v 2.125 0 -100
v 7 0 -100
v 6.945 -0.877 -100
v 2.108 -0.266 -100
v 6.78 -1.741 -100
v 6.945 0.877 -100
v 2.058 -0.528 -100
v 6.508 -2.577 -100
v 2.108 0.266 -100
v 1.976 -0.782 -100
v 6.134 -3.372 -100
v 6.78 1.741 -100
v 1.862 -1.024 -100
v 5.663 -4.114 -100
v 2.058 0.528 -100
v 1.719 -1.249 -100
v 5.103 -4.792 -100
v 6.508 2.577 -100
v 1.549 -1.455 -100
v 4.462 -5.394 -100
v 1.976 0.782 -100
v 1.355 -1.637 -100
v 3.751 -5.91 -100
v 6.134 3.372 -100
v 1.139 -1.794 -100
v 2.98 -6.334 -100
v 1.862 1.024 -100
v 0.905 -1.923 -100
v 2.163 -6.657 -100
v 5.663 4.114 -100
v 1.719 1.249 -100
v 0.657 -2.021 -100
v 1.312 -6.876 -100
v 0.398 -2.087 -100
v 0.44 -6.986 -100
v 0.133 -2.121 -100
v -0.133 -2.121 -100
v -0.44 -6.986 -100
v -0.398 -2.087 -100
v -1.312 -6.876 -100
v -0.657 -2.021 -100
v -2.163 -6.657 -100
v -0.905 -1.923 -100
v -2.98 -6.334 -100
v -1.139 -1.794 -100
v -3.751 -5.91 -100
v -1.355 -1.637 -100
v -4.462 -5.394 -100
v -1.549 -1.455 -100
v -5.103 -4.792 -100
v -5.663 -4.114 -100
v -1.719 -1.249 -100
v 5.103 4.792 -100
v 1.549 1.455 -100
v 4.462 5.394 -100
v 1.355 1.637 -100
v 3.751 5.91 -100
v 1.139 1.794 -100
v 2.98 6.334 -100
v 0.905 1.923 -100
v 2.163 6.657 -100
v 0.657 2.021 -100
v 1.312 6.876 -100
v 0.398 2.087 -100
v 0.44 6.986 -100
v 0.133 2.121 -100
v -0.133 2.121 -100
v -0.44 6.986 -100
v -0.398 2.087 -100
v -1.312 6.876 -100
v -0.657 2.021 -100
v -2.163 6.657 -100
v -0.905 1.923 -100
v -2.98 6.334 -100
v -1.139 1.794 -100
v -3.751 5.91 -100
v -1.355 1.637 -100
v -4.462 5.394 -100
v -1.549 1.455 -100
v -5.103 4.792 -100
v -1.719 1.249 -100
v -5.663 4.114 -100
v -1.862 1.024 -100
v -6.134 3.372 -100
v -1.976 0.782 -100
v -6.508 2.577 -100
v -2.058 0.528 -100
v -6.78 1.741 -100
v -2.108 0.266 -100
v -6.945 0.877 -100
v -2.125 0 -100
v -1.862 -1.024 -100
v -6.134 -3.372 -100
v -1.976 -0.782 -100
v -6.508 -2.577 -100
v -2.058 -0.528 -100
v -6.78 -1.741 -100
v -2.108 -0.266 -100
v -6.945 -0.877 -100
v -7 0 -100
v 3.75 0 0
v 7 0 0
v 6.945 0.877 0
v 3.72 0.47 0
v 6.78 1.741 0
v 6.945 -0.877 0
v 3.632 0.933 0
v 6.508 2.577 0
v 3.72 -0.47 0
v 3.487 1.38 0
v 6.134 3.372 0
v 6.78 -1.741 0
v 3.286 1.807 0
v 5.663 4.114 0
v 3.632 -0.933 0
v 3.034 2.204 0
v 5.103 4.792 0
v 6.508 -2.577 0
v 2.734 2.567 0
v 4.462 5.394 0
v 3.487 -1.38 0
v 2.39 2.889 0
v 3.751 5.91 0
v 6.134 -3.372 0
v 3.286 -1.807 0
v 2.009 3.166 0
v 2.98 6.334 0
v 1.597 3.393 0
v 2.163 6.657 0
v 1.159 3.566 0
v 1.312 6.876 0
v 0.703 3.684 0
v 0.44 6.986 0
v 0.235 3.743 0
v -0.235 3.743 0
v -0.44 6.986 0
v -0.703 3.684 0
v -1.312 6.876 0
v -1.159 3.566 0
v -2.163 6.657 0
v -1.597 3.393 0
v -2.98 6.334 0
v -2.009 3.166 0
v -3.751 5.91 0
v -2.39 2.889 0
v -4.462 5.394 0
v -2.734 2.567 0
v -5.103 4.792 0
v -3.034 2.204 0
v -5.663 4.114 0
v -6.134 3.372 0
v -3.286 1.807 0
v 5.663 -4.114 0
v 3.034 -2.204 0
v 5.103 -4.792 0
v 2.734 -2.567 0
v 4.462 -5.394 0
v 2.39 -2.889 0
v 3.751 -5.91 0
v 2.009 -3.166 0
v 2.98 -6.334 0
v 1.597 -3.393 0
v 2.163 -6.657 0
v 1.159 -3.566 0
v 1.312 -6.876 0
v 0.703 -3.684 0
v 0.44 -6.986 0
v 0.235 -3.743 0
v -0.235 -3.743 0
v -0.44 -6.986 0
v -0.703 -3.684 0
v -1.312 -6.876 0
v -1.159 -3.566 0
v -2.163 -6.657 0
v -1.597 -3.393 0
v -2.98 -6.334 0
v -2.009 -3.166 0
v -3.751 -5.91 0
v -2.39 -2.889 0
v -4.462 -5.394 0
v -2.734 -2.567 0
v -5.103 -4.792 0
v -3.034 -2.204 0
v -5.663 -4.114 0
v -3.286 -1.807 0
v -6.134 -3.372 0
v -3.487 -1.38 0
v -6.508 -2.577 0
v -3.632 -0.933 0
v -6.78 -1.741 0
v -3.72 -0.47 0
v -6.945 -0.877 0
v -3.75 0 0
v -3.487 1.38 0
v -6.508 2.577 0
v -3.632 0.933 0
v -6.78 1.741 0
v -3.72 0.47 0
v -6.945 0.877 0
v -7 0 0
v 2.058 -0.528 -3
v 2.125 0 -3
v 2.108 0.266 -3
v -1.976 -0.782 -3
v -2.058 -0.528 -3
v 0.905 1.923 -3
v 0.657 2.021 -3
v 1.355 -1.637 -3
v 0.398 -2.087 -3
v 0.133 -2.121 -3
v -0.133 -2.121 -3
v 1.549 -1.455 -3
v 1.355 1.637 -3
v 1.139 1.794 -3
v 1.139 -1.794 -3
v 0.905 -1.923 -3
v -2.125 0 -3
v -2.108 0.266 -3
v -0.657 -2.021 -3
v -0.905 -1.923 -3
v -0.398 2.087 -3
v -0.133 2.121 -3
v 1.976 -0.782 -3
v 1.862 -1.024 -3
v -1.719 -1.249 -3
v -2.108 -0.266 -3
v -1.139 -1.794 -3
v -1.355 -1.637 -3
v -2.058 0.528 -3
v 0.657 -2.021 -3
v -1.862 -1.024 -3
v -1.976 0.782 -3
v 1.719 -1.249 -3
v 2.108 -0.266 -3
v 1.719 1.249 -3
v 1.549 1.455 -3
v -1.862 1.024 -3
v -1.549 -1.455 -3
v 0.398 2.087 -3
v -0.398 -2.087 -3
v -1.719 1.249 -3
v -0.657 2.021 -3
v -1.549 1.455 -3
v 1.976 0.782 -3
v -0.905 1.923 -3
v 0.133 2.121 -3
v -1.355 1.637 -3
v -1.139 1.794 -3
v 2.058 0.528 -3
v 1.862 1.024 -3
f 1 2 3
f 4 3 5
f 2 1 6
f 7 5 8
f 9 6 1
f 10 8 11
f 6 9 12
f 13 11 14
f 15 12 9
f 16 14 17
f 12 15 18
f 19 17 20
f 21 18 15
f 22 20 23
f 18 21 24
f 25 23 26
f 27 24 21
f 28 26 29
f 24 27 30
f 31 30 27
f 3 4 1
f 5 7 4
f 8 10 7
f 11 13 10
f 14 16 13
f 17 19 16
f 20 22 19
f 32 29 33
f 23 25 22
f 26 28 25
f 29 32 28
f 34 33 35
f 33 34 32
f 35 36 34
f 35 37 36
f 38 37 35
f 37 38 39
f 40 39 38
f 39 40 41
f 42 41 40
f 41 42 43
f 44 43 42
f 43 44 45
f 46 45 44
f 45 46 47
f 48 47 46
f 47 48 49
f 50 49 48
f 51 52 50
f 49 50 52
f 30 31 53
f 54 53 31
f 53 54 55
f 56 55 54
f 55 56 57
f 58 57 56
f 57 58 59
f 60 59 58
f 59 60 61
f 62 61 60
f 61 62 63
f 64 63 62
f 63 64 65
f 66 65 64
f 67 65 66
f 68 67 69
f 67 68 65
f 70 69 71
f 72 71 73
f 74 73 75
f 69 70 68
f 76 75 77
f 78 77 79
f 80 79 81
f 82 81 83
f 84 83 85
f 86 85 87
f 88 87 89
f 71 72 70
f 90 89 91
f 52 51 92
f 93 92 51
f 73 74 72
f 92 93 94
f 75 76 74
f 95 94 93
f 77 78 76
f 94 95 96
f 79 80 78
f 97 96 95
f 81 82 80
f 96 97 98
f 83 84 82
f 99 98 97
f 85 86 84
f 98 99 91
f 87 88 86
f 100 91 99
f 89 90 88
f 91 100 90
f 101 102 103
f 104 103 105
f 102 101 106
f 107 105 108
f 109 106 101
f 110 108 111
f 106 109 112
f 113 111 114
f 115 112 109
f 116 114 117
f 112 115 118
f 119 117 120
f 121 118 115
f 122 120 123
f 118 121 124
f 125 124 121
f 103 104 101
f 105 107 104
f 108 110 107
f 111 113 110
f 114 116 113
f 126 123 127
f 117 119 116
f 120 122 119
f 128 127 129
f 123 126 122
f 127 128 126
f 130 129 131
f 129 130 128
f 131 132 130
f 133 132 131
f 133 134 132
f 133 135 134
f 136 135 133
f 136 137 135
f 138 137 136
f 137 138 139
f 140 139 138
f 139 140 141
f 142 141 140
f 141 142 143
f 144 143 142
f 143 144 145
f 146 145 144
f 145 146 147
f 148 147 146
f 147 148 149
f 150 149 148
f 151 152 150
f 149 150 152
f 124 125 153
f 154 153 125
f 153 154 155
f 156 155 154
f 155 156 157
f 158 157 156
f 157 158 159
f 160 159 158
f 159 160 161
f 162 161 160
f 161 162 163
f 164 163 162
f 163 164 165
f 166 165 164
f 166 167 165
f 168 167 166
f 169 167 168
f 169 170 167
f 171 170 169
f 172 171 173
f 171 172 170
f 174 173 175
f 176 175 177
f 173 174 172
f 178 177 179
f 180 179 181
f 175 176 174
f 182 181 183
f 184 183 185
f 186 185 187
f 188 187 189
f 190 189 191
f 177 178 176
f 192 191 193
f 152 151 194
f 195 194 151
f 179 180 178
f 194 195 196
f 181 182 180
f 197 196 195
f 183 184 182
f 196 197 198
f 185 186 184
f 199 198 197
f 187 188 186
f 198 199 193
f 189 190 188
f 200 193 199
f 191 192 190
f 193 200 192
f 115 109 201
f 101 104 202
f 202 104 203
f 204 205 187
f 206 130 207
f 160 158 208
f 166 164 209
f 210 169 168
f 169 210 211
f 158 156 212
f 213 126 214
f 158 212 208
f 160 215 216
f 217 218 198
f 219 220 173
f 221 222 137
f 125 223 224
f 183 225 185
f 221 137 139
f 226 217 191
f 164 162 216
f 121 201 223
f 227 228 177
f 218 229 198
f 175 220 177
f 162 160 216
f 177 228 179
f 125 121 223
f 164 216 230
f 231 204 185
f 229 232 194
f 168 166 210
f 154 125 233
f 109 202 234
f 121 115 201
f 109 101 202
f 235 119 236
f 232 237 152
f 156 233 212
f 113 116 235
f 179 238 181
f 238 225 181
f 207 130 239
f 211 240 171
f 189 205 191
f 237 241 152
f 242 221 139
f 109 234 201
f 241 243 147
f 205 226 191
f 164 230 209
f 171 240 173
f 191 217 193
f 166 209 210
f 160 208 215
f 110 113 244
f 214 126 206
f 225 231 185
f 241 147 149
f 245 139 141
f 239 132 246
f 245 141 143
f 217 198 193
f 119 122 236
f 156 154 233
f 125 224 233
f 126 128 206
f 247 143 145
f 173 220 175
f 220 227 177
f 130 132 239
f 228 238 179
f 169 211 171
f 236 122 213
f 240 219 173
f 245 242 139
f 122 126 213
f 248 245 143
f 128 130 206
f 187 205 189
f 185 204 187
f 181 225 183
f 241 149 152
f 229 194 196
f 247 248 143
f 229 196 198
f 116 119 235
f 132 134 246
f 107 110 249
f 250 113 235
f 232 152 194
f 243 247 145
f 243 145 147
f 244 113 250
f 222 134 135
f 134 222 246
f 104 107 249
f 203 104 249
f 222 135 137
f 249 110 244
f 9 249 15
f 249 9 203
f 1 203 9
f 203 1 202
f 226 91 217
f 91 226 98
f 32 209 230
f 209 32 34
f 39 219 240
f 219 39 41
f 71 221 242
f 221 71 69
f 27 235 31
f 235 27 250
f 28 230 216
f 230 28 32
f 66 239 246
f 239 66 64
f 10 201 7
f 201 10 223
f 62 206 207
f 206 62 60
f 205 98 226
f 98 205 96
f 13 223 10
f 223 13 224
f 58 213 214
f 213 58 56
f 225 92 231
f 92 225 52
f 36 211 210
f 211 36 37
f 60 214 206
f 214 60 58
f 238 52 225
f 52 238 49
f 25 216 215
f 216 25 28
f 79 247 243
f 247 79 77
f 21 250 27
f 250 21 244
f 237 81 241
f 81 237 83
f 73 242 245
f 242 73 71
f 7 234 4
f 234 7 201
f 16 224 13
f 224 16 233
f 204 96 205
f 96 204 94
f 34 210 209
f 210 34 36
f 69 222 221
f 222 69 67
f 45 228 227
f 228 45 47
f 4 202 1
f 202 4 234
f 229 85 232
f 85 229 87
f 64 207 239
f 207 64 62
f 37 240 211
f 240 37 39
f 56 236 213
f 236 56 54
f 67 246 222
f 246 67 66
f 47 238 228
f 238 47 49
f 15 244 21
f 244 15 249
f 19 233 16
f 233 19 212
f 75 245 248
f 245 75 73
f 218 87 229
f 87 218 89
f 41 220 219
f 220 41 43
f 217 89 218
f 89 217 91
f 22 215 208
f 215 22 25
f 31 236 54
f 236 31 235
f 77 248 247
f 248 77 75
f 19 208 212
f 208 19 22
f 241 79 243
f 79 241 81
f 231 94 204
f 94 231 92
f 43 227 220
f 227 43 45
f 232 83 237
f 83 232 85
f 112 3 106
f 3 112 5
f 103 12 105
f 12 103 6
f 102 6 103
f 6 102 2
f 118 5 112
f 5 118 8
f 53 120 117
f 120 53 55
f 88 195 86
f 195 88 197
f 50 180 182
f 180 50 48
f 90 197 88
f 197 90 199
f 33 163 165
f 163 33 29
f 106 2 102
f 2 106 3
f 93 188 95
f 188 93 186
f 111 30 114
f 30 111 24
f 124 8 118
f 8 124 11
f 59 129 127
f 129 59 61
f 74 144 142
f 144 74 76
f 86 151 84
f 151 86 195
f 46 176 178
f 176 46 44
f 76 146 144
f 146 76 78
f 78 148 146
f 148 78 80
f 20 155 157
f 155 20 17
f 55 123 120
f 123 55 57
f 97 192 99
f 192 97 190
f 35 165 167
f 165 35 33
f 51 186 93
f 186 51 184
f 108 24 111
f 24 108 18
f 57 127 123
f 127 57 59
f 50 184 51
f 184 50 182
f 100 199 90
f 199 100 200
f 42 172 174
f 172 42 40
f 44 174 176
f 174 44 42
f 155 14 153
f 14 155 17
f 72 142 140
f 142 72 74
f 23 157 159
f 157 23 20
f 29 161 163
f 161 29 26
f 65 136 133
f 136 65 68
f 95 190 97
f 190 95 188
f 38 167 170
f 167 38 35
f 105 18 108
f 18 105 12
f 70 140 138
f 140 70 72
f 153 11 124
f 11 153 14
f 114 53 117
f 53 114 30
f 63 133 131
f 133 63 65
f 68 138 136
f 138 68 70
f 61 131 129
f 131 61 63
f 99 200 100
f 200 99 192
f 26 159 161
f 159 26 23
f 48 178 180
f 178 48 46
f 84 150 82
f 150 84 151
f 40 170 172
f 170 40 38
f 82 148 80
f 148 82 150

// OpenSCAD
$fn = 50;


difference() {
	union() {
		translate(v = [0, 0, -100.0000000000]) {
			cylinder(h = 100, r = 7.0000000000);
		}
		cylinder(h = 0, r = 17.0000000000);
	}
	union() {
		translate(v = [0, 0, 0]) {
			rotate(a = [0, 0, 0]) {
				difference() {
					union() {
						#translate(v = [0, 0, -100.0000000000]) {
							cylinder(h = 100, r = 2.0000000000);
						}
						#translate(v = [0, 0, -3]) {
							cylinder(h = 3, r = 7.0000000000, r1 = 2.1250000000, r2 = 3.7500000000);
						}
						#translate(v = [0, 0, -100.0000000000]) {
							cylinder(h = 100, r = 2.1250000000);
						}
						#translate(v = [0, 0, -100.0000000000]) {
							cylinder(h = 100, r = 2.0000000000);
						}
					}
					union();
				}
			}
		}
	}
}
